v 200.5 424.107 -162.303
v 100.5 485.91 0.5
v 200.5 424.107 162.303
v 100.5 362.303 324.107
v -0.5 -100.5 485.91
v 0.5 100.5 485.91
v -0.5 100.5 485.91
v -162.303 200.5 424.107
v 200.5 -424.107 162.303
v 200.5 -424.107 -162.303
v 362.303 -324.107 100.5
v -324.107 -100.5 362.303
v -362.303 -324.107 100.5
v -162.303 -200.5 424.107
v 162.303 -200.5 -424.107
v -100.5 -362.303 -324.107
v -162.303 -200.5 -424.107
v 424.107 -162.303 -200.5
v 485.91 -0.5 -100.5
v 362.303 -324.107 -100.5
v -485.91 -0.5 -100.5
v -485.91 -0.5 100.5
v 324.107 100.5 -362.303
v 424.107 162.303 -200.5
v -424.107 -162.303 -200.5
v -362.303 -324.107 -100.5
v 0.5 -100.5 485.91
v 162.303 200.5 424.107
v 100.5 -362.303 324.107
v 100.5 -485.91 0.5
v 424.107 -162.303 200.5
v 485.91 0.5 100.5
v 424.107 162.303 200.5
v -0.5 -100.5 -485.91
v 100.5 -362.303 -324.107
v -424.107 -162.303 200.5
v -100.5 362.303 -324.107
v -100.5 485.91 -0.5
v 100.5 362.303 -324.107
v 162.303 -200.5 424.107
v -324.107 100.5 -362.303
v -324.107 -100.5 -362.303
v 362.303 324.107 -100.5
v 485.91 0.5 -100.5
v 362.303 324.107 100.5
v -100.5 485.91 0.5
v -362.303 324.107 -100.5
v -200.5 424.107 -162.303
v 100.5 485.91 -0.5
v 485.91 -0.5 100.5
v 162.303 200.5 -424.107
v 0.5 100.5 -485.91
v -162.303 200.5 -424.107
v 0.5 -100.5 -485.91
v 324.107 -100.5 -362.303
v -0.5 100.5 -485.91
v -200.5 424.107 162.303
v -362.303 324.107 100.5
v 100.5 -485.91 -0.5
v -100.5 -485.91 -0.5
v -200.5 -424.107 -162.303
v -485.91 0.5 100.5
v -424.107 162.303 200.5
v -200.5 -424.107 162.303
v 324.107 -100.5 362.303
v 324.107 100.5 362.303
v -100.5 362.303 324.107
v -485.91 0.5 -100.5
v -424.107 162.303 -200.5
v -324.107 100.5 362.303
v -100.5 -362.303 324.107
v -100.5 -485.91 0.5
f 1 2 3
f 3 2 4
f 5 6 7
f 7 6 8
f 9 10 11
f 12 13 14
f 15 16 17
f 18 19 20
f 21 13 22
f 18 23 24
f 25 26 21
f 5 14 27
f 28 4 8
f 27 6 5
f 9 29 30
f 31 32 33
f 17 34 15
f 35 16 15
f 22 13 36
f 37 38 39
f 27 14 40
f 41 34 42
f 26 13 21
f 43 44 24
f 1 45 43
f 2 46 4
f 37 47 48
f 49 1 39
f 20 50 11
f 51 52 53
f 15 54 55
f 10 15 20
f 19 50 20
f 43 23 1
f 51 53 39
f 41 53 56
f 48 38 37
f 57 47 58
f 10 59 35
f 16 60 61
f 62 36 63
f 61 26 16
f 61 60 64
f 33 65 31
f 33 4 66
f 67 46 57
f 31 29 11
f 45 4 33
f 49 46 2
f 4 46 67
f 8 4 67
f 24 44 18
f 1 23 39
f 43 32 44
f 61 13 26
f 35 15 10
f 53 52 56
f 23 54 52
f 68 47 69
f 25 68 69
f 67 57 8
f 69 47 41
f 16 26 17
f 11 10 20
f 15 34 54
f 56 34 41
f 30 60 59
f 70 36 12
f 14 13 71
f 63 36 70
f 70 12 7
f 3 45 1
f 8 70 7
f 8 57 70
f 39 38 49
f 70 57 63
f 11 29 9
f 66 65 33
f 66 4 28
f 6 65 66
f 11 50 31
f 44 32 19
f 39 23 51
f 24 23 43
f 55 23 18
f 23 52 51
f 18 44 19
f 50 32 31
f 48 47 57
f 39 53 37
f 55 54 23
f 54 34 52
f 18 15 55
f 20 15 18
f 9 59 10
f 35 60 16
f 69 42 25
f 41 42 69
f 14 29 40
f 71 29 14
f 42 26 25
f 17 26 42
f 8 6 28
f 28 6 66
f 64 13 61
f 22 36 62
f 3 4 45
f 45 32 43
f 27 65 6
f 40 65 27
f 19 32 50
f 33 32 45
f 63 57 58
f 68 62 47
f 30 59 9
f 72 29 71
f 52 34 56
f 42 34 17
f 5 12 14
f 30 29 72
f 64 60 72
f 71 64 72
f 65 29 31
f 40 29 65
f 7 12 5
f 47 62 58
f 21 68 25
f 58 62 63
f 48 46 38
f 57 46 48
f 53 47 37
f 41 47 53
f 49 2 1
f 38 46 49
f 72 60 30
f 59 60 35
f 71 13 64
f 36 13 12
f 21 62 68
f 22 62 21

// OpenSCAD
phi = (1+sqrt(5))/2; 

coords = [ 
        [0,+1,+3*phi], [0,+1,-3*phi], [0,-1,+3*phi], [0,-1,-3*phi], 
        [+1,+3*phi,0], [+1,-3*phi,0], [-1,+3*phi,0], [-1,-3*phi,0], 
        [+3*phi,0,+1], [+3*phi,0,-1], [-3*phi,0,+1], [-3*phi,0,-1], 

        [+2,+(1+2*phi),+phi], [+2,+(1+2*phi),-phi], [+2,-(1+2*phi),+phi], [+2,-(1+2*phi),-phi], 
        [-2,+(1+2*phi),+phi], [-2,+(1+2*phi),-phi], [-2,-(1+2*phi),+phi], [-2,-(1+2*phi),-phi], 

        [+(1+2*phi),+phi,+2], [+(1+2*phi),+phi,-2], [+(1+2*phi),-phi,+2], [+(1+2*phi),-phi,-2], 
        [-(1+2*phi),+phi,+2], [-(1+2*phi),+phi,-2], [-(1+2*phi),-phi,+2], [-(1+2*phi),-phi,-2], 

        [+phi,+2,+(1+2*phi)], [+phi,+2,-(1+2*phi)], [+phi,-2,+(1+2*phi)], [+phi,-2,-(1+2*phi)], 
        [-phi,+2,+(1+2*phi)], [-phi,+2,-(1+2*phi)], [-phi,-2,+(1+2*phi)], [-phi,-2,-(1+2*phi)], 

        [+1,+(2+phi),+2*phi], [+1,+(2+phi),-2*phi], [+1,-(2+phi),+2*phi], [+1,-(2+phi),-2*phi], 
        [-1,+(2+phi),+2*phi], [-1,+(2+phi),-2*phi], [-1,-(2+phi),+2*phi], [-1,-(2+phi),-2*phi], 

        [+(2+phi),+2*phi,+1], [+(2+phi),+2*phi,-1], [+(2+phi),-2*phi,+1], [+(2+phi),-2*phi,-1], 
        [-(2+phi),+2*phi,+1], [-(2+phi),+2*phi,-1], [-(2+phi),-2*phi,+1], [-(2+phi),-2*phi,-1], 

        [+2*phi,+1,+(2+phi)], [+2*phi,+1,-(2+phi)], [+2*phi,-1,+(2+phi)], [+2*phi,-1,-(2+phi)], 
        [-2*phi,+1,+(2+phi)], [-2*phi,+1,-(2+phi)], [-2*phi,-1,+(2+phi)], [-2*phi,-1,-(2+phi)], 
]; 

hull() { 
        for (a = [0 : len(coords) - 1]) { 
                echo(coords[a]); 
                translate(100 * coords[a]) cube([1, 1, 1], center = true); 
        } 
} 
